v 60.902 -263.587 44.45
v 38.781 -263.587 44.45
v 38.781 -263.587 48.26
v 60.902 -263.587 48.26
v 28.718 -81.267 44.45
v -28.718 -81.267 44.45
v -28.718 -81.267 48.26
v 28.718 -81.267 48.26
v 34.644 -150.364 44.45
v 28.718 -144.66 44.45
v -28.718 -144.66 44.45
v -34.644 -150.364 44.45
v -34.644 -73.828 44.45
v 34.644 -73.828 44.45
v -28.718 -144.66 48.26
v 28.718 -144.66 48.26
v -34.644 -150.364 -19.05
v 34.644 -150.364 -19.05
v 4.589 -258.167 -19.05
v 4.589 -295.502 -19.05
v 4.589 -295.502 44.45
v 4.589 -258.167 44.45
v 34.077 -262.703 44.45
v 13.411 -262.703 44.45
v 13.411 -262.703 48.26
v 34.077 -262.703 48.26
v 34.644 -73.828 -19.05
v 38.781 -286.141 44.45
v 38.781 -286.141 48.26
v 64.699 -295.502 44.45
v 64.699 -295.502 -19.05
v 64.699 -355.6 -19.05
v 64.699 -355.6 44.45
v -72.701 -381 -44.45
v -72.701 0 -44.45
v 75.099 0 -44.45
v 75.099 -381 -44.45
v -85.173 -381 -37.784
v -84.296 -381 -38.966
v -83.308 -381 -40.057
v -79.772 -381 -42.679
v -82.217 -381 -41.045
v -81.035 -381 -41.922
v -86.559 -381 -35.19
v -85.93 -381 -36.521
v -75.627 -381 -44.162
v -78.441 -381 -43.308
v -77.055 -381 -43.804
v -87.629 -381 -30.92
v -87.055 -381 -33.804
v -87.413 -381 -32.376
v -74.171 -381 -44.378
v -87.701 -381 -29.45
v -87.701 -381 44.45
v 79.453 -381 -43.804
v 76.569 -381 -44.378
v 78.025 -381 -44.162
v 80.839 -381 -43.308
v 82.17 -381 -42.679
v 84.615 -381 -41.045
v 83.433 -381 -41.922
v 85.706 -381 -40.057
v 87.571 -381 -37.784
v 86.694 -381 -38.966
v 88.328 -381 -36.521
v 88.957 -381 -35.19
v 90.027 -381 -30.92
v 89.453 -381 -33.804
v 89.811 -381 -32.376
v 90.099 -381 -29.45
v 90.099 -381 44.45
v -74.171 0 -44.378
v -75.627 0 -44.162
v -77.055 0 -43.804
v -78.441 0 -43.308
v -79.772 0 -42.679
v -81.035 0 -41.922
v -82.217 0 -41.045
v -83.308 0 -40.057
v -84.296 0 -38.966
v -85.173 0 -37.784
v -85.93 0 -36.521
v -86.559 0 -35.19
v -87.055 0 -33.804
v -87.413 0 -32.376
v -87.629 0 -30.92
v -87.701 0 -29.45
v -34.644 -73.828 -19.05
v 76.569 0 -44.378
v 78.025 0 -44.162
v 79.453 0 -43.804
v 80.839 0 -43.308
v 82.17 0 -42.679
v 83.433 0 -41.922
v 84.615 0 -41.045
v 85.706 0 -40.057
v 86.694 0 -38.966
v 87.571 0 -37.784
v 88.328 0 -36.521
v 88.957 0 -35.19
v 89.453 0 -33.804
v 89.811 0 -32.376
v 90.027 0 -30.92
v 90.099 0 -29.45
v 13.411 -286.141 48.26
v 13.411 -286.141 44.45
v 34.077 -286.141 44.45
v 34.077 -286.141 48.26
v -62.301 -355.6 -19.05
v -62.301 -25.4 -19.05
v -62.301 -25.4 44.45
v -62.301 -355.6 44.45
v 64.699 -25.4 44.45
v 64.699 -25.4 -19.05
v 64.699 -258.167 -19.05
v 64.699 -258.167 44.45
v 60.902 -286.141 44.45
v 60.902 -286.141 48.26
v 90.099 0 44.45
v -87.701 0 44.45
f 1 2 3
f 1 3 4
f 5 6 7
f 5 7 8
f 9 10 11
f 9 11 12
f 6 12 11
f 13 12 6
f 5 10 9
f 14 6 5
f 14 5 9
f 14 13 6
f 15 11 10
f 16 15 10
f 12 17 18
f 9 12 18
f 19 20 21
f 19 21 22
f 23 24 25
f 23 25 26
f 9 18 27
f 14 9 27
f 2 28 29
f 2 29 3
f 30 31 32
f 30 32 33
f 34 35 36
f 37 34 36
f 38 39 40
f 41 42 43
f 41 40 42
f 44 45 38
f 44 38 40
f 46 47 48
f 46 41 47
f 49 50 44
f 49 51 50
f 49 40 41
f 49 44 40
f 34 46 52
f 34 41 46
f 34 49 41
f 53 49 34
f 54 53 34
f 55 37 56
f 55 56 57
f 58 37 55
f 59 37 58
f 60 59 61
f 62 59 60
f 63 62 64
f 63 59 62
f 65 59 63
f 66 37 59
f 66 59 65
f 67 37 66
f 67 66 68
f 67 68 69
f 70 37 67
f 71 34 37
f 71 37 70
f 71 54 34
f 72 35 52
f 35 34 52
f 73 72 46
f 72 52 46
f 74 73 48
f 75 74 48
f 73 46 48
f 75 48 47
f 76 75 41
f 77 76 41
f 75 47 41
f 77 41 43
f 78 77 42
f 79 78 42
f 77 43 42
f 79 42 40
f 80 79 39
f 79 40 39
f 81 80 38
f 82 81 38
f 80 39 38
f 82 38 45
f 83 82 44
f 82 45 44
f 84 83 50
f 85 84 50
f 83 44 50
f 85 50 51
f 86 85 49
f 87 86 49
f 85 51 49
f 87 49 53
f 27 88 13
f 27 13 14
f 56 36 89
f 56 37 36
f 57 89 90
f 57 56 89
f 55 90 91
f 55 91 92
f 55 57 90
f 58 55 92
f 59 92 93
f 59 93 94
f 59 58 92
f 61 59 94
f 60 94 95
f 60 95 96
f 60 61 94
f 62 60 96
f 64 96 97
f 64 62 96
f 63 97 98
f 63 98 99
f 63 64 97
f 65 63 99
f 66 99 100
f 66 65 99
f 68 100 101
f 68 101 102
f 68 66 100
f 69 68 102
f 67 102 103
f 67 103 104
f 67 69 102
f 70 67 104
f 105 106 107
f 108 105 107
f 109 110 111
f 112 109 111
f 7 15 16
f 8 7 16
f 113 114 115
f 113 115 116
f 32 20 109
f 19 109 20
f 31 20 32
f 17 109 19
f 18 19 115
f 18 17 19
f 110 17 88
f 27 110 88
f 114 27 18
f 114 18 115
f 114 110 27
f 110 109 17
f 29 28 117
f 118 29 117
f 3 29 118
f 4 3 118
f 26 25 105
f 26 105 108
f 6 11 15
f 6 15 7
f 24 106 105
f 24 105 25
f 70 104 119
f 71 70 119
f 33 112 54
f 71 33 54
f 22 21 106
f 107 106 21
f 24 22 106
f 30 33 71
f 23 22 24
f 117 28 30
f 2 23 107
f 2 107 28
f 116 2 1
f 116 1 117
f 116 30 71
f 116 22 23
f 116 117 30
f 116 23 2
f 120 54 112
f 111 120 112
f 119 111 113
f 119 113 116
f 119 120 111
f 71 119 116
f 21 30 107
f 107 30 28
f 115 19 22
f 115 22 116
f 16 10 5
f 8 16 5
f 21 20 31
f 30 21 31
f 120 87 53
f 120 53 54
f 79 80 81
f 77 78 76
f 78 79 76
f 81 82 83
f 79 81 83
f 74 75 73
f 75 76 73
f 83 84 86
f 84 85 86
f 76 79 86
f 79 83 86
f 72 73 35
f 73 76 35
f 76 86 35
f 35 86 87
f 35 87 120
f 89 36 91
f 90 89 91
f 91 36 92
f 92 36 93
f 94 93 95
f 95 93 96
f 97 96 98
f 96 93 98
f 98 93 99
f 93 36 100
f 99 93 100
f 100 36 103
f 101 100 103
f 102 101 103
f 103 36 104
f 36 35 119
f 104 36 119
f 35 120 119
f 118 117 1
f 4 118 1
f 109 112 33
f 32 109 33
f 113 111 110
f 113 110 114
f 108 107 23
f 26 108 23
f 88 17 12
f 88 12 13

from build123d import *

# Parameters (mm, degrees)
F0_W     = 177.8
F0_H     = 88.9
F1_DEPTH = 381
F2_T     = -25.4
F3_W     = 69.2884027958
F3_H     = 76.5359997749
F3_W_2   = 60.1096697411
F3_H_2   = 37.3346805573
F4_DEPTH = 63.5
F5_W     = 57.4366301298
F5_H     = 63.3930116892
F5_W_2   = 22.1205726266
F5_H_2   = 22.5539207458
F5_W_3   = 20.6655599177
F5_H_3   = 23.4381556511
F6_DEPTH = 3.81
F7_R     = 15
F8_R     = 15


with BuildPart() as f1:
    # F0 (on Front) → F1 (new body)
    with BuildSketch(Plane.XZ):
        with Locations((1.1990362685, 0)):
            Rectangle(F0_W, F0_H)
    extrude(amount=F1_DEPTH)

    # F2
    f2_openings = [f1.faces().sort_by_distance(p)[0] for p in [
        (1.199036, -190.5, 44.45),
    ]]
    offset(amount=F2_T, openings=f2_openings)

    # F3 (on face) → F4 (join)
    with BuildSketch(Plane.XY.offset(-19.05)):
        with Locations((0, -112.0956093073)):
            Rectangle(F3_W, F3_H)
        with Locations((34.6442013979, -276.8346965313)):
            Rectangle(F3_W_2, F3_H_2)
    extrude(amount=F4_DEPTH)

    # F5 (on face) → F6 (join)
    with BuildSketch(Plane.XY.offset(44.45)):
        with Locations((0, -112.9631772637)):
            Rectangle(F5_W, F5_H)
        with Locations((49.8413220048, -274.8637795448)):
            Rectangle(F5_W_2, F5_H_2)
        with Locations((23.7438436598, -274.4216620922)):
            Rectangle(F5_W_3, F5_H_3)
    extrude(amount=F6_DEPTH)

    # F7
    f7_edges = [f1.edges().sort_by_distance(p)[0] for p in [
        (90.099036, -190.5, -44.45),
    ]]
    fillet(f7_edges, radius=F7_R)

    # F8
    f8_edges = [f1.edges().sort_by_distance(p)[0] for p in [
        (-87.700964, -190.5, -44.45),
    ]]
    fillet(f8_edges, radius=F8_R)


solid = f1.part
